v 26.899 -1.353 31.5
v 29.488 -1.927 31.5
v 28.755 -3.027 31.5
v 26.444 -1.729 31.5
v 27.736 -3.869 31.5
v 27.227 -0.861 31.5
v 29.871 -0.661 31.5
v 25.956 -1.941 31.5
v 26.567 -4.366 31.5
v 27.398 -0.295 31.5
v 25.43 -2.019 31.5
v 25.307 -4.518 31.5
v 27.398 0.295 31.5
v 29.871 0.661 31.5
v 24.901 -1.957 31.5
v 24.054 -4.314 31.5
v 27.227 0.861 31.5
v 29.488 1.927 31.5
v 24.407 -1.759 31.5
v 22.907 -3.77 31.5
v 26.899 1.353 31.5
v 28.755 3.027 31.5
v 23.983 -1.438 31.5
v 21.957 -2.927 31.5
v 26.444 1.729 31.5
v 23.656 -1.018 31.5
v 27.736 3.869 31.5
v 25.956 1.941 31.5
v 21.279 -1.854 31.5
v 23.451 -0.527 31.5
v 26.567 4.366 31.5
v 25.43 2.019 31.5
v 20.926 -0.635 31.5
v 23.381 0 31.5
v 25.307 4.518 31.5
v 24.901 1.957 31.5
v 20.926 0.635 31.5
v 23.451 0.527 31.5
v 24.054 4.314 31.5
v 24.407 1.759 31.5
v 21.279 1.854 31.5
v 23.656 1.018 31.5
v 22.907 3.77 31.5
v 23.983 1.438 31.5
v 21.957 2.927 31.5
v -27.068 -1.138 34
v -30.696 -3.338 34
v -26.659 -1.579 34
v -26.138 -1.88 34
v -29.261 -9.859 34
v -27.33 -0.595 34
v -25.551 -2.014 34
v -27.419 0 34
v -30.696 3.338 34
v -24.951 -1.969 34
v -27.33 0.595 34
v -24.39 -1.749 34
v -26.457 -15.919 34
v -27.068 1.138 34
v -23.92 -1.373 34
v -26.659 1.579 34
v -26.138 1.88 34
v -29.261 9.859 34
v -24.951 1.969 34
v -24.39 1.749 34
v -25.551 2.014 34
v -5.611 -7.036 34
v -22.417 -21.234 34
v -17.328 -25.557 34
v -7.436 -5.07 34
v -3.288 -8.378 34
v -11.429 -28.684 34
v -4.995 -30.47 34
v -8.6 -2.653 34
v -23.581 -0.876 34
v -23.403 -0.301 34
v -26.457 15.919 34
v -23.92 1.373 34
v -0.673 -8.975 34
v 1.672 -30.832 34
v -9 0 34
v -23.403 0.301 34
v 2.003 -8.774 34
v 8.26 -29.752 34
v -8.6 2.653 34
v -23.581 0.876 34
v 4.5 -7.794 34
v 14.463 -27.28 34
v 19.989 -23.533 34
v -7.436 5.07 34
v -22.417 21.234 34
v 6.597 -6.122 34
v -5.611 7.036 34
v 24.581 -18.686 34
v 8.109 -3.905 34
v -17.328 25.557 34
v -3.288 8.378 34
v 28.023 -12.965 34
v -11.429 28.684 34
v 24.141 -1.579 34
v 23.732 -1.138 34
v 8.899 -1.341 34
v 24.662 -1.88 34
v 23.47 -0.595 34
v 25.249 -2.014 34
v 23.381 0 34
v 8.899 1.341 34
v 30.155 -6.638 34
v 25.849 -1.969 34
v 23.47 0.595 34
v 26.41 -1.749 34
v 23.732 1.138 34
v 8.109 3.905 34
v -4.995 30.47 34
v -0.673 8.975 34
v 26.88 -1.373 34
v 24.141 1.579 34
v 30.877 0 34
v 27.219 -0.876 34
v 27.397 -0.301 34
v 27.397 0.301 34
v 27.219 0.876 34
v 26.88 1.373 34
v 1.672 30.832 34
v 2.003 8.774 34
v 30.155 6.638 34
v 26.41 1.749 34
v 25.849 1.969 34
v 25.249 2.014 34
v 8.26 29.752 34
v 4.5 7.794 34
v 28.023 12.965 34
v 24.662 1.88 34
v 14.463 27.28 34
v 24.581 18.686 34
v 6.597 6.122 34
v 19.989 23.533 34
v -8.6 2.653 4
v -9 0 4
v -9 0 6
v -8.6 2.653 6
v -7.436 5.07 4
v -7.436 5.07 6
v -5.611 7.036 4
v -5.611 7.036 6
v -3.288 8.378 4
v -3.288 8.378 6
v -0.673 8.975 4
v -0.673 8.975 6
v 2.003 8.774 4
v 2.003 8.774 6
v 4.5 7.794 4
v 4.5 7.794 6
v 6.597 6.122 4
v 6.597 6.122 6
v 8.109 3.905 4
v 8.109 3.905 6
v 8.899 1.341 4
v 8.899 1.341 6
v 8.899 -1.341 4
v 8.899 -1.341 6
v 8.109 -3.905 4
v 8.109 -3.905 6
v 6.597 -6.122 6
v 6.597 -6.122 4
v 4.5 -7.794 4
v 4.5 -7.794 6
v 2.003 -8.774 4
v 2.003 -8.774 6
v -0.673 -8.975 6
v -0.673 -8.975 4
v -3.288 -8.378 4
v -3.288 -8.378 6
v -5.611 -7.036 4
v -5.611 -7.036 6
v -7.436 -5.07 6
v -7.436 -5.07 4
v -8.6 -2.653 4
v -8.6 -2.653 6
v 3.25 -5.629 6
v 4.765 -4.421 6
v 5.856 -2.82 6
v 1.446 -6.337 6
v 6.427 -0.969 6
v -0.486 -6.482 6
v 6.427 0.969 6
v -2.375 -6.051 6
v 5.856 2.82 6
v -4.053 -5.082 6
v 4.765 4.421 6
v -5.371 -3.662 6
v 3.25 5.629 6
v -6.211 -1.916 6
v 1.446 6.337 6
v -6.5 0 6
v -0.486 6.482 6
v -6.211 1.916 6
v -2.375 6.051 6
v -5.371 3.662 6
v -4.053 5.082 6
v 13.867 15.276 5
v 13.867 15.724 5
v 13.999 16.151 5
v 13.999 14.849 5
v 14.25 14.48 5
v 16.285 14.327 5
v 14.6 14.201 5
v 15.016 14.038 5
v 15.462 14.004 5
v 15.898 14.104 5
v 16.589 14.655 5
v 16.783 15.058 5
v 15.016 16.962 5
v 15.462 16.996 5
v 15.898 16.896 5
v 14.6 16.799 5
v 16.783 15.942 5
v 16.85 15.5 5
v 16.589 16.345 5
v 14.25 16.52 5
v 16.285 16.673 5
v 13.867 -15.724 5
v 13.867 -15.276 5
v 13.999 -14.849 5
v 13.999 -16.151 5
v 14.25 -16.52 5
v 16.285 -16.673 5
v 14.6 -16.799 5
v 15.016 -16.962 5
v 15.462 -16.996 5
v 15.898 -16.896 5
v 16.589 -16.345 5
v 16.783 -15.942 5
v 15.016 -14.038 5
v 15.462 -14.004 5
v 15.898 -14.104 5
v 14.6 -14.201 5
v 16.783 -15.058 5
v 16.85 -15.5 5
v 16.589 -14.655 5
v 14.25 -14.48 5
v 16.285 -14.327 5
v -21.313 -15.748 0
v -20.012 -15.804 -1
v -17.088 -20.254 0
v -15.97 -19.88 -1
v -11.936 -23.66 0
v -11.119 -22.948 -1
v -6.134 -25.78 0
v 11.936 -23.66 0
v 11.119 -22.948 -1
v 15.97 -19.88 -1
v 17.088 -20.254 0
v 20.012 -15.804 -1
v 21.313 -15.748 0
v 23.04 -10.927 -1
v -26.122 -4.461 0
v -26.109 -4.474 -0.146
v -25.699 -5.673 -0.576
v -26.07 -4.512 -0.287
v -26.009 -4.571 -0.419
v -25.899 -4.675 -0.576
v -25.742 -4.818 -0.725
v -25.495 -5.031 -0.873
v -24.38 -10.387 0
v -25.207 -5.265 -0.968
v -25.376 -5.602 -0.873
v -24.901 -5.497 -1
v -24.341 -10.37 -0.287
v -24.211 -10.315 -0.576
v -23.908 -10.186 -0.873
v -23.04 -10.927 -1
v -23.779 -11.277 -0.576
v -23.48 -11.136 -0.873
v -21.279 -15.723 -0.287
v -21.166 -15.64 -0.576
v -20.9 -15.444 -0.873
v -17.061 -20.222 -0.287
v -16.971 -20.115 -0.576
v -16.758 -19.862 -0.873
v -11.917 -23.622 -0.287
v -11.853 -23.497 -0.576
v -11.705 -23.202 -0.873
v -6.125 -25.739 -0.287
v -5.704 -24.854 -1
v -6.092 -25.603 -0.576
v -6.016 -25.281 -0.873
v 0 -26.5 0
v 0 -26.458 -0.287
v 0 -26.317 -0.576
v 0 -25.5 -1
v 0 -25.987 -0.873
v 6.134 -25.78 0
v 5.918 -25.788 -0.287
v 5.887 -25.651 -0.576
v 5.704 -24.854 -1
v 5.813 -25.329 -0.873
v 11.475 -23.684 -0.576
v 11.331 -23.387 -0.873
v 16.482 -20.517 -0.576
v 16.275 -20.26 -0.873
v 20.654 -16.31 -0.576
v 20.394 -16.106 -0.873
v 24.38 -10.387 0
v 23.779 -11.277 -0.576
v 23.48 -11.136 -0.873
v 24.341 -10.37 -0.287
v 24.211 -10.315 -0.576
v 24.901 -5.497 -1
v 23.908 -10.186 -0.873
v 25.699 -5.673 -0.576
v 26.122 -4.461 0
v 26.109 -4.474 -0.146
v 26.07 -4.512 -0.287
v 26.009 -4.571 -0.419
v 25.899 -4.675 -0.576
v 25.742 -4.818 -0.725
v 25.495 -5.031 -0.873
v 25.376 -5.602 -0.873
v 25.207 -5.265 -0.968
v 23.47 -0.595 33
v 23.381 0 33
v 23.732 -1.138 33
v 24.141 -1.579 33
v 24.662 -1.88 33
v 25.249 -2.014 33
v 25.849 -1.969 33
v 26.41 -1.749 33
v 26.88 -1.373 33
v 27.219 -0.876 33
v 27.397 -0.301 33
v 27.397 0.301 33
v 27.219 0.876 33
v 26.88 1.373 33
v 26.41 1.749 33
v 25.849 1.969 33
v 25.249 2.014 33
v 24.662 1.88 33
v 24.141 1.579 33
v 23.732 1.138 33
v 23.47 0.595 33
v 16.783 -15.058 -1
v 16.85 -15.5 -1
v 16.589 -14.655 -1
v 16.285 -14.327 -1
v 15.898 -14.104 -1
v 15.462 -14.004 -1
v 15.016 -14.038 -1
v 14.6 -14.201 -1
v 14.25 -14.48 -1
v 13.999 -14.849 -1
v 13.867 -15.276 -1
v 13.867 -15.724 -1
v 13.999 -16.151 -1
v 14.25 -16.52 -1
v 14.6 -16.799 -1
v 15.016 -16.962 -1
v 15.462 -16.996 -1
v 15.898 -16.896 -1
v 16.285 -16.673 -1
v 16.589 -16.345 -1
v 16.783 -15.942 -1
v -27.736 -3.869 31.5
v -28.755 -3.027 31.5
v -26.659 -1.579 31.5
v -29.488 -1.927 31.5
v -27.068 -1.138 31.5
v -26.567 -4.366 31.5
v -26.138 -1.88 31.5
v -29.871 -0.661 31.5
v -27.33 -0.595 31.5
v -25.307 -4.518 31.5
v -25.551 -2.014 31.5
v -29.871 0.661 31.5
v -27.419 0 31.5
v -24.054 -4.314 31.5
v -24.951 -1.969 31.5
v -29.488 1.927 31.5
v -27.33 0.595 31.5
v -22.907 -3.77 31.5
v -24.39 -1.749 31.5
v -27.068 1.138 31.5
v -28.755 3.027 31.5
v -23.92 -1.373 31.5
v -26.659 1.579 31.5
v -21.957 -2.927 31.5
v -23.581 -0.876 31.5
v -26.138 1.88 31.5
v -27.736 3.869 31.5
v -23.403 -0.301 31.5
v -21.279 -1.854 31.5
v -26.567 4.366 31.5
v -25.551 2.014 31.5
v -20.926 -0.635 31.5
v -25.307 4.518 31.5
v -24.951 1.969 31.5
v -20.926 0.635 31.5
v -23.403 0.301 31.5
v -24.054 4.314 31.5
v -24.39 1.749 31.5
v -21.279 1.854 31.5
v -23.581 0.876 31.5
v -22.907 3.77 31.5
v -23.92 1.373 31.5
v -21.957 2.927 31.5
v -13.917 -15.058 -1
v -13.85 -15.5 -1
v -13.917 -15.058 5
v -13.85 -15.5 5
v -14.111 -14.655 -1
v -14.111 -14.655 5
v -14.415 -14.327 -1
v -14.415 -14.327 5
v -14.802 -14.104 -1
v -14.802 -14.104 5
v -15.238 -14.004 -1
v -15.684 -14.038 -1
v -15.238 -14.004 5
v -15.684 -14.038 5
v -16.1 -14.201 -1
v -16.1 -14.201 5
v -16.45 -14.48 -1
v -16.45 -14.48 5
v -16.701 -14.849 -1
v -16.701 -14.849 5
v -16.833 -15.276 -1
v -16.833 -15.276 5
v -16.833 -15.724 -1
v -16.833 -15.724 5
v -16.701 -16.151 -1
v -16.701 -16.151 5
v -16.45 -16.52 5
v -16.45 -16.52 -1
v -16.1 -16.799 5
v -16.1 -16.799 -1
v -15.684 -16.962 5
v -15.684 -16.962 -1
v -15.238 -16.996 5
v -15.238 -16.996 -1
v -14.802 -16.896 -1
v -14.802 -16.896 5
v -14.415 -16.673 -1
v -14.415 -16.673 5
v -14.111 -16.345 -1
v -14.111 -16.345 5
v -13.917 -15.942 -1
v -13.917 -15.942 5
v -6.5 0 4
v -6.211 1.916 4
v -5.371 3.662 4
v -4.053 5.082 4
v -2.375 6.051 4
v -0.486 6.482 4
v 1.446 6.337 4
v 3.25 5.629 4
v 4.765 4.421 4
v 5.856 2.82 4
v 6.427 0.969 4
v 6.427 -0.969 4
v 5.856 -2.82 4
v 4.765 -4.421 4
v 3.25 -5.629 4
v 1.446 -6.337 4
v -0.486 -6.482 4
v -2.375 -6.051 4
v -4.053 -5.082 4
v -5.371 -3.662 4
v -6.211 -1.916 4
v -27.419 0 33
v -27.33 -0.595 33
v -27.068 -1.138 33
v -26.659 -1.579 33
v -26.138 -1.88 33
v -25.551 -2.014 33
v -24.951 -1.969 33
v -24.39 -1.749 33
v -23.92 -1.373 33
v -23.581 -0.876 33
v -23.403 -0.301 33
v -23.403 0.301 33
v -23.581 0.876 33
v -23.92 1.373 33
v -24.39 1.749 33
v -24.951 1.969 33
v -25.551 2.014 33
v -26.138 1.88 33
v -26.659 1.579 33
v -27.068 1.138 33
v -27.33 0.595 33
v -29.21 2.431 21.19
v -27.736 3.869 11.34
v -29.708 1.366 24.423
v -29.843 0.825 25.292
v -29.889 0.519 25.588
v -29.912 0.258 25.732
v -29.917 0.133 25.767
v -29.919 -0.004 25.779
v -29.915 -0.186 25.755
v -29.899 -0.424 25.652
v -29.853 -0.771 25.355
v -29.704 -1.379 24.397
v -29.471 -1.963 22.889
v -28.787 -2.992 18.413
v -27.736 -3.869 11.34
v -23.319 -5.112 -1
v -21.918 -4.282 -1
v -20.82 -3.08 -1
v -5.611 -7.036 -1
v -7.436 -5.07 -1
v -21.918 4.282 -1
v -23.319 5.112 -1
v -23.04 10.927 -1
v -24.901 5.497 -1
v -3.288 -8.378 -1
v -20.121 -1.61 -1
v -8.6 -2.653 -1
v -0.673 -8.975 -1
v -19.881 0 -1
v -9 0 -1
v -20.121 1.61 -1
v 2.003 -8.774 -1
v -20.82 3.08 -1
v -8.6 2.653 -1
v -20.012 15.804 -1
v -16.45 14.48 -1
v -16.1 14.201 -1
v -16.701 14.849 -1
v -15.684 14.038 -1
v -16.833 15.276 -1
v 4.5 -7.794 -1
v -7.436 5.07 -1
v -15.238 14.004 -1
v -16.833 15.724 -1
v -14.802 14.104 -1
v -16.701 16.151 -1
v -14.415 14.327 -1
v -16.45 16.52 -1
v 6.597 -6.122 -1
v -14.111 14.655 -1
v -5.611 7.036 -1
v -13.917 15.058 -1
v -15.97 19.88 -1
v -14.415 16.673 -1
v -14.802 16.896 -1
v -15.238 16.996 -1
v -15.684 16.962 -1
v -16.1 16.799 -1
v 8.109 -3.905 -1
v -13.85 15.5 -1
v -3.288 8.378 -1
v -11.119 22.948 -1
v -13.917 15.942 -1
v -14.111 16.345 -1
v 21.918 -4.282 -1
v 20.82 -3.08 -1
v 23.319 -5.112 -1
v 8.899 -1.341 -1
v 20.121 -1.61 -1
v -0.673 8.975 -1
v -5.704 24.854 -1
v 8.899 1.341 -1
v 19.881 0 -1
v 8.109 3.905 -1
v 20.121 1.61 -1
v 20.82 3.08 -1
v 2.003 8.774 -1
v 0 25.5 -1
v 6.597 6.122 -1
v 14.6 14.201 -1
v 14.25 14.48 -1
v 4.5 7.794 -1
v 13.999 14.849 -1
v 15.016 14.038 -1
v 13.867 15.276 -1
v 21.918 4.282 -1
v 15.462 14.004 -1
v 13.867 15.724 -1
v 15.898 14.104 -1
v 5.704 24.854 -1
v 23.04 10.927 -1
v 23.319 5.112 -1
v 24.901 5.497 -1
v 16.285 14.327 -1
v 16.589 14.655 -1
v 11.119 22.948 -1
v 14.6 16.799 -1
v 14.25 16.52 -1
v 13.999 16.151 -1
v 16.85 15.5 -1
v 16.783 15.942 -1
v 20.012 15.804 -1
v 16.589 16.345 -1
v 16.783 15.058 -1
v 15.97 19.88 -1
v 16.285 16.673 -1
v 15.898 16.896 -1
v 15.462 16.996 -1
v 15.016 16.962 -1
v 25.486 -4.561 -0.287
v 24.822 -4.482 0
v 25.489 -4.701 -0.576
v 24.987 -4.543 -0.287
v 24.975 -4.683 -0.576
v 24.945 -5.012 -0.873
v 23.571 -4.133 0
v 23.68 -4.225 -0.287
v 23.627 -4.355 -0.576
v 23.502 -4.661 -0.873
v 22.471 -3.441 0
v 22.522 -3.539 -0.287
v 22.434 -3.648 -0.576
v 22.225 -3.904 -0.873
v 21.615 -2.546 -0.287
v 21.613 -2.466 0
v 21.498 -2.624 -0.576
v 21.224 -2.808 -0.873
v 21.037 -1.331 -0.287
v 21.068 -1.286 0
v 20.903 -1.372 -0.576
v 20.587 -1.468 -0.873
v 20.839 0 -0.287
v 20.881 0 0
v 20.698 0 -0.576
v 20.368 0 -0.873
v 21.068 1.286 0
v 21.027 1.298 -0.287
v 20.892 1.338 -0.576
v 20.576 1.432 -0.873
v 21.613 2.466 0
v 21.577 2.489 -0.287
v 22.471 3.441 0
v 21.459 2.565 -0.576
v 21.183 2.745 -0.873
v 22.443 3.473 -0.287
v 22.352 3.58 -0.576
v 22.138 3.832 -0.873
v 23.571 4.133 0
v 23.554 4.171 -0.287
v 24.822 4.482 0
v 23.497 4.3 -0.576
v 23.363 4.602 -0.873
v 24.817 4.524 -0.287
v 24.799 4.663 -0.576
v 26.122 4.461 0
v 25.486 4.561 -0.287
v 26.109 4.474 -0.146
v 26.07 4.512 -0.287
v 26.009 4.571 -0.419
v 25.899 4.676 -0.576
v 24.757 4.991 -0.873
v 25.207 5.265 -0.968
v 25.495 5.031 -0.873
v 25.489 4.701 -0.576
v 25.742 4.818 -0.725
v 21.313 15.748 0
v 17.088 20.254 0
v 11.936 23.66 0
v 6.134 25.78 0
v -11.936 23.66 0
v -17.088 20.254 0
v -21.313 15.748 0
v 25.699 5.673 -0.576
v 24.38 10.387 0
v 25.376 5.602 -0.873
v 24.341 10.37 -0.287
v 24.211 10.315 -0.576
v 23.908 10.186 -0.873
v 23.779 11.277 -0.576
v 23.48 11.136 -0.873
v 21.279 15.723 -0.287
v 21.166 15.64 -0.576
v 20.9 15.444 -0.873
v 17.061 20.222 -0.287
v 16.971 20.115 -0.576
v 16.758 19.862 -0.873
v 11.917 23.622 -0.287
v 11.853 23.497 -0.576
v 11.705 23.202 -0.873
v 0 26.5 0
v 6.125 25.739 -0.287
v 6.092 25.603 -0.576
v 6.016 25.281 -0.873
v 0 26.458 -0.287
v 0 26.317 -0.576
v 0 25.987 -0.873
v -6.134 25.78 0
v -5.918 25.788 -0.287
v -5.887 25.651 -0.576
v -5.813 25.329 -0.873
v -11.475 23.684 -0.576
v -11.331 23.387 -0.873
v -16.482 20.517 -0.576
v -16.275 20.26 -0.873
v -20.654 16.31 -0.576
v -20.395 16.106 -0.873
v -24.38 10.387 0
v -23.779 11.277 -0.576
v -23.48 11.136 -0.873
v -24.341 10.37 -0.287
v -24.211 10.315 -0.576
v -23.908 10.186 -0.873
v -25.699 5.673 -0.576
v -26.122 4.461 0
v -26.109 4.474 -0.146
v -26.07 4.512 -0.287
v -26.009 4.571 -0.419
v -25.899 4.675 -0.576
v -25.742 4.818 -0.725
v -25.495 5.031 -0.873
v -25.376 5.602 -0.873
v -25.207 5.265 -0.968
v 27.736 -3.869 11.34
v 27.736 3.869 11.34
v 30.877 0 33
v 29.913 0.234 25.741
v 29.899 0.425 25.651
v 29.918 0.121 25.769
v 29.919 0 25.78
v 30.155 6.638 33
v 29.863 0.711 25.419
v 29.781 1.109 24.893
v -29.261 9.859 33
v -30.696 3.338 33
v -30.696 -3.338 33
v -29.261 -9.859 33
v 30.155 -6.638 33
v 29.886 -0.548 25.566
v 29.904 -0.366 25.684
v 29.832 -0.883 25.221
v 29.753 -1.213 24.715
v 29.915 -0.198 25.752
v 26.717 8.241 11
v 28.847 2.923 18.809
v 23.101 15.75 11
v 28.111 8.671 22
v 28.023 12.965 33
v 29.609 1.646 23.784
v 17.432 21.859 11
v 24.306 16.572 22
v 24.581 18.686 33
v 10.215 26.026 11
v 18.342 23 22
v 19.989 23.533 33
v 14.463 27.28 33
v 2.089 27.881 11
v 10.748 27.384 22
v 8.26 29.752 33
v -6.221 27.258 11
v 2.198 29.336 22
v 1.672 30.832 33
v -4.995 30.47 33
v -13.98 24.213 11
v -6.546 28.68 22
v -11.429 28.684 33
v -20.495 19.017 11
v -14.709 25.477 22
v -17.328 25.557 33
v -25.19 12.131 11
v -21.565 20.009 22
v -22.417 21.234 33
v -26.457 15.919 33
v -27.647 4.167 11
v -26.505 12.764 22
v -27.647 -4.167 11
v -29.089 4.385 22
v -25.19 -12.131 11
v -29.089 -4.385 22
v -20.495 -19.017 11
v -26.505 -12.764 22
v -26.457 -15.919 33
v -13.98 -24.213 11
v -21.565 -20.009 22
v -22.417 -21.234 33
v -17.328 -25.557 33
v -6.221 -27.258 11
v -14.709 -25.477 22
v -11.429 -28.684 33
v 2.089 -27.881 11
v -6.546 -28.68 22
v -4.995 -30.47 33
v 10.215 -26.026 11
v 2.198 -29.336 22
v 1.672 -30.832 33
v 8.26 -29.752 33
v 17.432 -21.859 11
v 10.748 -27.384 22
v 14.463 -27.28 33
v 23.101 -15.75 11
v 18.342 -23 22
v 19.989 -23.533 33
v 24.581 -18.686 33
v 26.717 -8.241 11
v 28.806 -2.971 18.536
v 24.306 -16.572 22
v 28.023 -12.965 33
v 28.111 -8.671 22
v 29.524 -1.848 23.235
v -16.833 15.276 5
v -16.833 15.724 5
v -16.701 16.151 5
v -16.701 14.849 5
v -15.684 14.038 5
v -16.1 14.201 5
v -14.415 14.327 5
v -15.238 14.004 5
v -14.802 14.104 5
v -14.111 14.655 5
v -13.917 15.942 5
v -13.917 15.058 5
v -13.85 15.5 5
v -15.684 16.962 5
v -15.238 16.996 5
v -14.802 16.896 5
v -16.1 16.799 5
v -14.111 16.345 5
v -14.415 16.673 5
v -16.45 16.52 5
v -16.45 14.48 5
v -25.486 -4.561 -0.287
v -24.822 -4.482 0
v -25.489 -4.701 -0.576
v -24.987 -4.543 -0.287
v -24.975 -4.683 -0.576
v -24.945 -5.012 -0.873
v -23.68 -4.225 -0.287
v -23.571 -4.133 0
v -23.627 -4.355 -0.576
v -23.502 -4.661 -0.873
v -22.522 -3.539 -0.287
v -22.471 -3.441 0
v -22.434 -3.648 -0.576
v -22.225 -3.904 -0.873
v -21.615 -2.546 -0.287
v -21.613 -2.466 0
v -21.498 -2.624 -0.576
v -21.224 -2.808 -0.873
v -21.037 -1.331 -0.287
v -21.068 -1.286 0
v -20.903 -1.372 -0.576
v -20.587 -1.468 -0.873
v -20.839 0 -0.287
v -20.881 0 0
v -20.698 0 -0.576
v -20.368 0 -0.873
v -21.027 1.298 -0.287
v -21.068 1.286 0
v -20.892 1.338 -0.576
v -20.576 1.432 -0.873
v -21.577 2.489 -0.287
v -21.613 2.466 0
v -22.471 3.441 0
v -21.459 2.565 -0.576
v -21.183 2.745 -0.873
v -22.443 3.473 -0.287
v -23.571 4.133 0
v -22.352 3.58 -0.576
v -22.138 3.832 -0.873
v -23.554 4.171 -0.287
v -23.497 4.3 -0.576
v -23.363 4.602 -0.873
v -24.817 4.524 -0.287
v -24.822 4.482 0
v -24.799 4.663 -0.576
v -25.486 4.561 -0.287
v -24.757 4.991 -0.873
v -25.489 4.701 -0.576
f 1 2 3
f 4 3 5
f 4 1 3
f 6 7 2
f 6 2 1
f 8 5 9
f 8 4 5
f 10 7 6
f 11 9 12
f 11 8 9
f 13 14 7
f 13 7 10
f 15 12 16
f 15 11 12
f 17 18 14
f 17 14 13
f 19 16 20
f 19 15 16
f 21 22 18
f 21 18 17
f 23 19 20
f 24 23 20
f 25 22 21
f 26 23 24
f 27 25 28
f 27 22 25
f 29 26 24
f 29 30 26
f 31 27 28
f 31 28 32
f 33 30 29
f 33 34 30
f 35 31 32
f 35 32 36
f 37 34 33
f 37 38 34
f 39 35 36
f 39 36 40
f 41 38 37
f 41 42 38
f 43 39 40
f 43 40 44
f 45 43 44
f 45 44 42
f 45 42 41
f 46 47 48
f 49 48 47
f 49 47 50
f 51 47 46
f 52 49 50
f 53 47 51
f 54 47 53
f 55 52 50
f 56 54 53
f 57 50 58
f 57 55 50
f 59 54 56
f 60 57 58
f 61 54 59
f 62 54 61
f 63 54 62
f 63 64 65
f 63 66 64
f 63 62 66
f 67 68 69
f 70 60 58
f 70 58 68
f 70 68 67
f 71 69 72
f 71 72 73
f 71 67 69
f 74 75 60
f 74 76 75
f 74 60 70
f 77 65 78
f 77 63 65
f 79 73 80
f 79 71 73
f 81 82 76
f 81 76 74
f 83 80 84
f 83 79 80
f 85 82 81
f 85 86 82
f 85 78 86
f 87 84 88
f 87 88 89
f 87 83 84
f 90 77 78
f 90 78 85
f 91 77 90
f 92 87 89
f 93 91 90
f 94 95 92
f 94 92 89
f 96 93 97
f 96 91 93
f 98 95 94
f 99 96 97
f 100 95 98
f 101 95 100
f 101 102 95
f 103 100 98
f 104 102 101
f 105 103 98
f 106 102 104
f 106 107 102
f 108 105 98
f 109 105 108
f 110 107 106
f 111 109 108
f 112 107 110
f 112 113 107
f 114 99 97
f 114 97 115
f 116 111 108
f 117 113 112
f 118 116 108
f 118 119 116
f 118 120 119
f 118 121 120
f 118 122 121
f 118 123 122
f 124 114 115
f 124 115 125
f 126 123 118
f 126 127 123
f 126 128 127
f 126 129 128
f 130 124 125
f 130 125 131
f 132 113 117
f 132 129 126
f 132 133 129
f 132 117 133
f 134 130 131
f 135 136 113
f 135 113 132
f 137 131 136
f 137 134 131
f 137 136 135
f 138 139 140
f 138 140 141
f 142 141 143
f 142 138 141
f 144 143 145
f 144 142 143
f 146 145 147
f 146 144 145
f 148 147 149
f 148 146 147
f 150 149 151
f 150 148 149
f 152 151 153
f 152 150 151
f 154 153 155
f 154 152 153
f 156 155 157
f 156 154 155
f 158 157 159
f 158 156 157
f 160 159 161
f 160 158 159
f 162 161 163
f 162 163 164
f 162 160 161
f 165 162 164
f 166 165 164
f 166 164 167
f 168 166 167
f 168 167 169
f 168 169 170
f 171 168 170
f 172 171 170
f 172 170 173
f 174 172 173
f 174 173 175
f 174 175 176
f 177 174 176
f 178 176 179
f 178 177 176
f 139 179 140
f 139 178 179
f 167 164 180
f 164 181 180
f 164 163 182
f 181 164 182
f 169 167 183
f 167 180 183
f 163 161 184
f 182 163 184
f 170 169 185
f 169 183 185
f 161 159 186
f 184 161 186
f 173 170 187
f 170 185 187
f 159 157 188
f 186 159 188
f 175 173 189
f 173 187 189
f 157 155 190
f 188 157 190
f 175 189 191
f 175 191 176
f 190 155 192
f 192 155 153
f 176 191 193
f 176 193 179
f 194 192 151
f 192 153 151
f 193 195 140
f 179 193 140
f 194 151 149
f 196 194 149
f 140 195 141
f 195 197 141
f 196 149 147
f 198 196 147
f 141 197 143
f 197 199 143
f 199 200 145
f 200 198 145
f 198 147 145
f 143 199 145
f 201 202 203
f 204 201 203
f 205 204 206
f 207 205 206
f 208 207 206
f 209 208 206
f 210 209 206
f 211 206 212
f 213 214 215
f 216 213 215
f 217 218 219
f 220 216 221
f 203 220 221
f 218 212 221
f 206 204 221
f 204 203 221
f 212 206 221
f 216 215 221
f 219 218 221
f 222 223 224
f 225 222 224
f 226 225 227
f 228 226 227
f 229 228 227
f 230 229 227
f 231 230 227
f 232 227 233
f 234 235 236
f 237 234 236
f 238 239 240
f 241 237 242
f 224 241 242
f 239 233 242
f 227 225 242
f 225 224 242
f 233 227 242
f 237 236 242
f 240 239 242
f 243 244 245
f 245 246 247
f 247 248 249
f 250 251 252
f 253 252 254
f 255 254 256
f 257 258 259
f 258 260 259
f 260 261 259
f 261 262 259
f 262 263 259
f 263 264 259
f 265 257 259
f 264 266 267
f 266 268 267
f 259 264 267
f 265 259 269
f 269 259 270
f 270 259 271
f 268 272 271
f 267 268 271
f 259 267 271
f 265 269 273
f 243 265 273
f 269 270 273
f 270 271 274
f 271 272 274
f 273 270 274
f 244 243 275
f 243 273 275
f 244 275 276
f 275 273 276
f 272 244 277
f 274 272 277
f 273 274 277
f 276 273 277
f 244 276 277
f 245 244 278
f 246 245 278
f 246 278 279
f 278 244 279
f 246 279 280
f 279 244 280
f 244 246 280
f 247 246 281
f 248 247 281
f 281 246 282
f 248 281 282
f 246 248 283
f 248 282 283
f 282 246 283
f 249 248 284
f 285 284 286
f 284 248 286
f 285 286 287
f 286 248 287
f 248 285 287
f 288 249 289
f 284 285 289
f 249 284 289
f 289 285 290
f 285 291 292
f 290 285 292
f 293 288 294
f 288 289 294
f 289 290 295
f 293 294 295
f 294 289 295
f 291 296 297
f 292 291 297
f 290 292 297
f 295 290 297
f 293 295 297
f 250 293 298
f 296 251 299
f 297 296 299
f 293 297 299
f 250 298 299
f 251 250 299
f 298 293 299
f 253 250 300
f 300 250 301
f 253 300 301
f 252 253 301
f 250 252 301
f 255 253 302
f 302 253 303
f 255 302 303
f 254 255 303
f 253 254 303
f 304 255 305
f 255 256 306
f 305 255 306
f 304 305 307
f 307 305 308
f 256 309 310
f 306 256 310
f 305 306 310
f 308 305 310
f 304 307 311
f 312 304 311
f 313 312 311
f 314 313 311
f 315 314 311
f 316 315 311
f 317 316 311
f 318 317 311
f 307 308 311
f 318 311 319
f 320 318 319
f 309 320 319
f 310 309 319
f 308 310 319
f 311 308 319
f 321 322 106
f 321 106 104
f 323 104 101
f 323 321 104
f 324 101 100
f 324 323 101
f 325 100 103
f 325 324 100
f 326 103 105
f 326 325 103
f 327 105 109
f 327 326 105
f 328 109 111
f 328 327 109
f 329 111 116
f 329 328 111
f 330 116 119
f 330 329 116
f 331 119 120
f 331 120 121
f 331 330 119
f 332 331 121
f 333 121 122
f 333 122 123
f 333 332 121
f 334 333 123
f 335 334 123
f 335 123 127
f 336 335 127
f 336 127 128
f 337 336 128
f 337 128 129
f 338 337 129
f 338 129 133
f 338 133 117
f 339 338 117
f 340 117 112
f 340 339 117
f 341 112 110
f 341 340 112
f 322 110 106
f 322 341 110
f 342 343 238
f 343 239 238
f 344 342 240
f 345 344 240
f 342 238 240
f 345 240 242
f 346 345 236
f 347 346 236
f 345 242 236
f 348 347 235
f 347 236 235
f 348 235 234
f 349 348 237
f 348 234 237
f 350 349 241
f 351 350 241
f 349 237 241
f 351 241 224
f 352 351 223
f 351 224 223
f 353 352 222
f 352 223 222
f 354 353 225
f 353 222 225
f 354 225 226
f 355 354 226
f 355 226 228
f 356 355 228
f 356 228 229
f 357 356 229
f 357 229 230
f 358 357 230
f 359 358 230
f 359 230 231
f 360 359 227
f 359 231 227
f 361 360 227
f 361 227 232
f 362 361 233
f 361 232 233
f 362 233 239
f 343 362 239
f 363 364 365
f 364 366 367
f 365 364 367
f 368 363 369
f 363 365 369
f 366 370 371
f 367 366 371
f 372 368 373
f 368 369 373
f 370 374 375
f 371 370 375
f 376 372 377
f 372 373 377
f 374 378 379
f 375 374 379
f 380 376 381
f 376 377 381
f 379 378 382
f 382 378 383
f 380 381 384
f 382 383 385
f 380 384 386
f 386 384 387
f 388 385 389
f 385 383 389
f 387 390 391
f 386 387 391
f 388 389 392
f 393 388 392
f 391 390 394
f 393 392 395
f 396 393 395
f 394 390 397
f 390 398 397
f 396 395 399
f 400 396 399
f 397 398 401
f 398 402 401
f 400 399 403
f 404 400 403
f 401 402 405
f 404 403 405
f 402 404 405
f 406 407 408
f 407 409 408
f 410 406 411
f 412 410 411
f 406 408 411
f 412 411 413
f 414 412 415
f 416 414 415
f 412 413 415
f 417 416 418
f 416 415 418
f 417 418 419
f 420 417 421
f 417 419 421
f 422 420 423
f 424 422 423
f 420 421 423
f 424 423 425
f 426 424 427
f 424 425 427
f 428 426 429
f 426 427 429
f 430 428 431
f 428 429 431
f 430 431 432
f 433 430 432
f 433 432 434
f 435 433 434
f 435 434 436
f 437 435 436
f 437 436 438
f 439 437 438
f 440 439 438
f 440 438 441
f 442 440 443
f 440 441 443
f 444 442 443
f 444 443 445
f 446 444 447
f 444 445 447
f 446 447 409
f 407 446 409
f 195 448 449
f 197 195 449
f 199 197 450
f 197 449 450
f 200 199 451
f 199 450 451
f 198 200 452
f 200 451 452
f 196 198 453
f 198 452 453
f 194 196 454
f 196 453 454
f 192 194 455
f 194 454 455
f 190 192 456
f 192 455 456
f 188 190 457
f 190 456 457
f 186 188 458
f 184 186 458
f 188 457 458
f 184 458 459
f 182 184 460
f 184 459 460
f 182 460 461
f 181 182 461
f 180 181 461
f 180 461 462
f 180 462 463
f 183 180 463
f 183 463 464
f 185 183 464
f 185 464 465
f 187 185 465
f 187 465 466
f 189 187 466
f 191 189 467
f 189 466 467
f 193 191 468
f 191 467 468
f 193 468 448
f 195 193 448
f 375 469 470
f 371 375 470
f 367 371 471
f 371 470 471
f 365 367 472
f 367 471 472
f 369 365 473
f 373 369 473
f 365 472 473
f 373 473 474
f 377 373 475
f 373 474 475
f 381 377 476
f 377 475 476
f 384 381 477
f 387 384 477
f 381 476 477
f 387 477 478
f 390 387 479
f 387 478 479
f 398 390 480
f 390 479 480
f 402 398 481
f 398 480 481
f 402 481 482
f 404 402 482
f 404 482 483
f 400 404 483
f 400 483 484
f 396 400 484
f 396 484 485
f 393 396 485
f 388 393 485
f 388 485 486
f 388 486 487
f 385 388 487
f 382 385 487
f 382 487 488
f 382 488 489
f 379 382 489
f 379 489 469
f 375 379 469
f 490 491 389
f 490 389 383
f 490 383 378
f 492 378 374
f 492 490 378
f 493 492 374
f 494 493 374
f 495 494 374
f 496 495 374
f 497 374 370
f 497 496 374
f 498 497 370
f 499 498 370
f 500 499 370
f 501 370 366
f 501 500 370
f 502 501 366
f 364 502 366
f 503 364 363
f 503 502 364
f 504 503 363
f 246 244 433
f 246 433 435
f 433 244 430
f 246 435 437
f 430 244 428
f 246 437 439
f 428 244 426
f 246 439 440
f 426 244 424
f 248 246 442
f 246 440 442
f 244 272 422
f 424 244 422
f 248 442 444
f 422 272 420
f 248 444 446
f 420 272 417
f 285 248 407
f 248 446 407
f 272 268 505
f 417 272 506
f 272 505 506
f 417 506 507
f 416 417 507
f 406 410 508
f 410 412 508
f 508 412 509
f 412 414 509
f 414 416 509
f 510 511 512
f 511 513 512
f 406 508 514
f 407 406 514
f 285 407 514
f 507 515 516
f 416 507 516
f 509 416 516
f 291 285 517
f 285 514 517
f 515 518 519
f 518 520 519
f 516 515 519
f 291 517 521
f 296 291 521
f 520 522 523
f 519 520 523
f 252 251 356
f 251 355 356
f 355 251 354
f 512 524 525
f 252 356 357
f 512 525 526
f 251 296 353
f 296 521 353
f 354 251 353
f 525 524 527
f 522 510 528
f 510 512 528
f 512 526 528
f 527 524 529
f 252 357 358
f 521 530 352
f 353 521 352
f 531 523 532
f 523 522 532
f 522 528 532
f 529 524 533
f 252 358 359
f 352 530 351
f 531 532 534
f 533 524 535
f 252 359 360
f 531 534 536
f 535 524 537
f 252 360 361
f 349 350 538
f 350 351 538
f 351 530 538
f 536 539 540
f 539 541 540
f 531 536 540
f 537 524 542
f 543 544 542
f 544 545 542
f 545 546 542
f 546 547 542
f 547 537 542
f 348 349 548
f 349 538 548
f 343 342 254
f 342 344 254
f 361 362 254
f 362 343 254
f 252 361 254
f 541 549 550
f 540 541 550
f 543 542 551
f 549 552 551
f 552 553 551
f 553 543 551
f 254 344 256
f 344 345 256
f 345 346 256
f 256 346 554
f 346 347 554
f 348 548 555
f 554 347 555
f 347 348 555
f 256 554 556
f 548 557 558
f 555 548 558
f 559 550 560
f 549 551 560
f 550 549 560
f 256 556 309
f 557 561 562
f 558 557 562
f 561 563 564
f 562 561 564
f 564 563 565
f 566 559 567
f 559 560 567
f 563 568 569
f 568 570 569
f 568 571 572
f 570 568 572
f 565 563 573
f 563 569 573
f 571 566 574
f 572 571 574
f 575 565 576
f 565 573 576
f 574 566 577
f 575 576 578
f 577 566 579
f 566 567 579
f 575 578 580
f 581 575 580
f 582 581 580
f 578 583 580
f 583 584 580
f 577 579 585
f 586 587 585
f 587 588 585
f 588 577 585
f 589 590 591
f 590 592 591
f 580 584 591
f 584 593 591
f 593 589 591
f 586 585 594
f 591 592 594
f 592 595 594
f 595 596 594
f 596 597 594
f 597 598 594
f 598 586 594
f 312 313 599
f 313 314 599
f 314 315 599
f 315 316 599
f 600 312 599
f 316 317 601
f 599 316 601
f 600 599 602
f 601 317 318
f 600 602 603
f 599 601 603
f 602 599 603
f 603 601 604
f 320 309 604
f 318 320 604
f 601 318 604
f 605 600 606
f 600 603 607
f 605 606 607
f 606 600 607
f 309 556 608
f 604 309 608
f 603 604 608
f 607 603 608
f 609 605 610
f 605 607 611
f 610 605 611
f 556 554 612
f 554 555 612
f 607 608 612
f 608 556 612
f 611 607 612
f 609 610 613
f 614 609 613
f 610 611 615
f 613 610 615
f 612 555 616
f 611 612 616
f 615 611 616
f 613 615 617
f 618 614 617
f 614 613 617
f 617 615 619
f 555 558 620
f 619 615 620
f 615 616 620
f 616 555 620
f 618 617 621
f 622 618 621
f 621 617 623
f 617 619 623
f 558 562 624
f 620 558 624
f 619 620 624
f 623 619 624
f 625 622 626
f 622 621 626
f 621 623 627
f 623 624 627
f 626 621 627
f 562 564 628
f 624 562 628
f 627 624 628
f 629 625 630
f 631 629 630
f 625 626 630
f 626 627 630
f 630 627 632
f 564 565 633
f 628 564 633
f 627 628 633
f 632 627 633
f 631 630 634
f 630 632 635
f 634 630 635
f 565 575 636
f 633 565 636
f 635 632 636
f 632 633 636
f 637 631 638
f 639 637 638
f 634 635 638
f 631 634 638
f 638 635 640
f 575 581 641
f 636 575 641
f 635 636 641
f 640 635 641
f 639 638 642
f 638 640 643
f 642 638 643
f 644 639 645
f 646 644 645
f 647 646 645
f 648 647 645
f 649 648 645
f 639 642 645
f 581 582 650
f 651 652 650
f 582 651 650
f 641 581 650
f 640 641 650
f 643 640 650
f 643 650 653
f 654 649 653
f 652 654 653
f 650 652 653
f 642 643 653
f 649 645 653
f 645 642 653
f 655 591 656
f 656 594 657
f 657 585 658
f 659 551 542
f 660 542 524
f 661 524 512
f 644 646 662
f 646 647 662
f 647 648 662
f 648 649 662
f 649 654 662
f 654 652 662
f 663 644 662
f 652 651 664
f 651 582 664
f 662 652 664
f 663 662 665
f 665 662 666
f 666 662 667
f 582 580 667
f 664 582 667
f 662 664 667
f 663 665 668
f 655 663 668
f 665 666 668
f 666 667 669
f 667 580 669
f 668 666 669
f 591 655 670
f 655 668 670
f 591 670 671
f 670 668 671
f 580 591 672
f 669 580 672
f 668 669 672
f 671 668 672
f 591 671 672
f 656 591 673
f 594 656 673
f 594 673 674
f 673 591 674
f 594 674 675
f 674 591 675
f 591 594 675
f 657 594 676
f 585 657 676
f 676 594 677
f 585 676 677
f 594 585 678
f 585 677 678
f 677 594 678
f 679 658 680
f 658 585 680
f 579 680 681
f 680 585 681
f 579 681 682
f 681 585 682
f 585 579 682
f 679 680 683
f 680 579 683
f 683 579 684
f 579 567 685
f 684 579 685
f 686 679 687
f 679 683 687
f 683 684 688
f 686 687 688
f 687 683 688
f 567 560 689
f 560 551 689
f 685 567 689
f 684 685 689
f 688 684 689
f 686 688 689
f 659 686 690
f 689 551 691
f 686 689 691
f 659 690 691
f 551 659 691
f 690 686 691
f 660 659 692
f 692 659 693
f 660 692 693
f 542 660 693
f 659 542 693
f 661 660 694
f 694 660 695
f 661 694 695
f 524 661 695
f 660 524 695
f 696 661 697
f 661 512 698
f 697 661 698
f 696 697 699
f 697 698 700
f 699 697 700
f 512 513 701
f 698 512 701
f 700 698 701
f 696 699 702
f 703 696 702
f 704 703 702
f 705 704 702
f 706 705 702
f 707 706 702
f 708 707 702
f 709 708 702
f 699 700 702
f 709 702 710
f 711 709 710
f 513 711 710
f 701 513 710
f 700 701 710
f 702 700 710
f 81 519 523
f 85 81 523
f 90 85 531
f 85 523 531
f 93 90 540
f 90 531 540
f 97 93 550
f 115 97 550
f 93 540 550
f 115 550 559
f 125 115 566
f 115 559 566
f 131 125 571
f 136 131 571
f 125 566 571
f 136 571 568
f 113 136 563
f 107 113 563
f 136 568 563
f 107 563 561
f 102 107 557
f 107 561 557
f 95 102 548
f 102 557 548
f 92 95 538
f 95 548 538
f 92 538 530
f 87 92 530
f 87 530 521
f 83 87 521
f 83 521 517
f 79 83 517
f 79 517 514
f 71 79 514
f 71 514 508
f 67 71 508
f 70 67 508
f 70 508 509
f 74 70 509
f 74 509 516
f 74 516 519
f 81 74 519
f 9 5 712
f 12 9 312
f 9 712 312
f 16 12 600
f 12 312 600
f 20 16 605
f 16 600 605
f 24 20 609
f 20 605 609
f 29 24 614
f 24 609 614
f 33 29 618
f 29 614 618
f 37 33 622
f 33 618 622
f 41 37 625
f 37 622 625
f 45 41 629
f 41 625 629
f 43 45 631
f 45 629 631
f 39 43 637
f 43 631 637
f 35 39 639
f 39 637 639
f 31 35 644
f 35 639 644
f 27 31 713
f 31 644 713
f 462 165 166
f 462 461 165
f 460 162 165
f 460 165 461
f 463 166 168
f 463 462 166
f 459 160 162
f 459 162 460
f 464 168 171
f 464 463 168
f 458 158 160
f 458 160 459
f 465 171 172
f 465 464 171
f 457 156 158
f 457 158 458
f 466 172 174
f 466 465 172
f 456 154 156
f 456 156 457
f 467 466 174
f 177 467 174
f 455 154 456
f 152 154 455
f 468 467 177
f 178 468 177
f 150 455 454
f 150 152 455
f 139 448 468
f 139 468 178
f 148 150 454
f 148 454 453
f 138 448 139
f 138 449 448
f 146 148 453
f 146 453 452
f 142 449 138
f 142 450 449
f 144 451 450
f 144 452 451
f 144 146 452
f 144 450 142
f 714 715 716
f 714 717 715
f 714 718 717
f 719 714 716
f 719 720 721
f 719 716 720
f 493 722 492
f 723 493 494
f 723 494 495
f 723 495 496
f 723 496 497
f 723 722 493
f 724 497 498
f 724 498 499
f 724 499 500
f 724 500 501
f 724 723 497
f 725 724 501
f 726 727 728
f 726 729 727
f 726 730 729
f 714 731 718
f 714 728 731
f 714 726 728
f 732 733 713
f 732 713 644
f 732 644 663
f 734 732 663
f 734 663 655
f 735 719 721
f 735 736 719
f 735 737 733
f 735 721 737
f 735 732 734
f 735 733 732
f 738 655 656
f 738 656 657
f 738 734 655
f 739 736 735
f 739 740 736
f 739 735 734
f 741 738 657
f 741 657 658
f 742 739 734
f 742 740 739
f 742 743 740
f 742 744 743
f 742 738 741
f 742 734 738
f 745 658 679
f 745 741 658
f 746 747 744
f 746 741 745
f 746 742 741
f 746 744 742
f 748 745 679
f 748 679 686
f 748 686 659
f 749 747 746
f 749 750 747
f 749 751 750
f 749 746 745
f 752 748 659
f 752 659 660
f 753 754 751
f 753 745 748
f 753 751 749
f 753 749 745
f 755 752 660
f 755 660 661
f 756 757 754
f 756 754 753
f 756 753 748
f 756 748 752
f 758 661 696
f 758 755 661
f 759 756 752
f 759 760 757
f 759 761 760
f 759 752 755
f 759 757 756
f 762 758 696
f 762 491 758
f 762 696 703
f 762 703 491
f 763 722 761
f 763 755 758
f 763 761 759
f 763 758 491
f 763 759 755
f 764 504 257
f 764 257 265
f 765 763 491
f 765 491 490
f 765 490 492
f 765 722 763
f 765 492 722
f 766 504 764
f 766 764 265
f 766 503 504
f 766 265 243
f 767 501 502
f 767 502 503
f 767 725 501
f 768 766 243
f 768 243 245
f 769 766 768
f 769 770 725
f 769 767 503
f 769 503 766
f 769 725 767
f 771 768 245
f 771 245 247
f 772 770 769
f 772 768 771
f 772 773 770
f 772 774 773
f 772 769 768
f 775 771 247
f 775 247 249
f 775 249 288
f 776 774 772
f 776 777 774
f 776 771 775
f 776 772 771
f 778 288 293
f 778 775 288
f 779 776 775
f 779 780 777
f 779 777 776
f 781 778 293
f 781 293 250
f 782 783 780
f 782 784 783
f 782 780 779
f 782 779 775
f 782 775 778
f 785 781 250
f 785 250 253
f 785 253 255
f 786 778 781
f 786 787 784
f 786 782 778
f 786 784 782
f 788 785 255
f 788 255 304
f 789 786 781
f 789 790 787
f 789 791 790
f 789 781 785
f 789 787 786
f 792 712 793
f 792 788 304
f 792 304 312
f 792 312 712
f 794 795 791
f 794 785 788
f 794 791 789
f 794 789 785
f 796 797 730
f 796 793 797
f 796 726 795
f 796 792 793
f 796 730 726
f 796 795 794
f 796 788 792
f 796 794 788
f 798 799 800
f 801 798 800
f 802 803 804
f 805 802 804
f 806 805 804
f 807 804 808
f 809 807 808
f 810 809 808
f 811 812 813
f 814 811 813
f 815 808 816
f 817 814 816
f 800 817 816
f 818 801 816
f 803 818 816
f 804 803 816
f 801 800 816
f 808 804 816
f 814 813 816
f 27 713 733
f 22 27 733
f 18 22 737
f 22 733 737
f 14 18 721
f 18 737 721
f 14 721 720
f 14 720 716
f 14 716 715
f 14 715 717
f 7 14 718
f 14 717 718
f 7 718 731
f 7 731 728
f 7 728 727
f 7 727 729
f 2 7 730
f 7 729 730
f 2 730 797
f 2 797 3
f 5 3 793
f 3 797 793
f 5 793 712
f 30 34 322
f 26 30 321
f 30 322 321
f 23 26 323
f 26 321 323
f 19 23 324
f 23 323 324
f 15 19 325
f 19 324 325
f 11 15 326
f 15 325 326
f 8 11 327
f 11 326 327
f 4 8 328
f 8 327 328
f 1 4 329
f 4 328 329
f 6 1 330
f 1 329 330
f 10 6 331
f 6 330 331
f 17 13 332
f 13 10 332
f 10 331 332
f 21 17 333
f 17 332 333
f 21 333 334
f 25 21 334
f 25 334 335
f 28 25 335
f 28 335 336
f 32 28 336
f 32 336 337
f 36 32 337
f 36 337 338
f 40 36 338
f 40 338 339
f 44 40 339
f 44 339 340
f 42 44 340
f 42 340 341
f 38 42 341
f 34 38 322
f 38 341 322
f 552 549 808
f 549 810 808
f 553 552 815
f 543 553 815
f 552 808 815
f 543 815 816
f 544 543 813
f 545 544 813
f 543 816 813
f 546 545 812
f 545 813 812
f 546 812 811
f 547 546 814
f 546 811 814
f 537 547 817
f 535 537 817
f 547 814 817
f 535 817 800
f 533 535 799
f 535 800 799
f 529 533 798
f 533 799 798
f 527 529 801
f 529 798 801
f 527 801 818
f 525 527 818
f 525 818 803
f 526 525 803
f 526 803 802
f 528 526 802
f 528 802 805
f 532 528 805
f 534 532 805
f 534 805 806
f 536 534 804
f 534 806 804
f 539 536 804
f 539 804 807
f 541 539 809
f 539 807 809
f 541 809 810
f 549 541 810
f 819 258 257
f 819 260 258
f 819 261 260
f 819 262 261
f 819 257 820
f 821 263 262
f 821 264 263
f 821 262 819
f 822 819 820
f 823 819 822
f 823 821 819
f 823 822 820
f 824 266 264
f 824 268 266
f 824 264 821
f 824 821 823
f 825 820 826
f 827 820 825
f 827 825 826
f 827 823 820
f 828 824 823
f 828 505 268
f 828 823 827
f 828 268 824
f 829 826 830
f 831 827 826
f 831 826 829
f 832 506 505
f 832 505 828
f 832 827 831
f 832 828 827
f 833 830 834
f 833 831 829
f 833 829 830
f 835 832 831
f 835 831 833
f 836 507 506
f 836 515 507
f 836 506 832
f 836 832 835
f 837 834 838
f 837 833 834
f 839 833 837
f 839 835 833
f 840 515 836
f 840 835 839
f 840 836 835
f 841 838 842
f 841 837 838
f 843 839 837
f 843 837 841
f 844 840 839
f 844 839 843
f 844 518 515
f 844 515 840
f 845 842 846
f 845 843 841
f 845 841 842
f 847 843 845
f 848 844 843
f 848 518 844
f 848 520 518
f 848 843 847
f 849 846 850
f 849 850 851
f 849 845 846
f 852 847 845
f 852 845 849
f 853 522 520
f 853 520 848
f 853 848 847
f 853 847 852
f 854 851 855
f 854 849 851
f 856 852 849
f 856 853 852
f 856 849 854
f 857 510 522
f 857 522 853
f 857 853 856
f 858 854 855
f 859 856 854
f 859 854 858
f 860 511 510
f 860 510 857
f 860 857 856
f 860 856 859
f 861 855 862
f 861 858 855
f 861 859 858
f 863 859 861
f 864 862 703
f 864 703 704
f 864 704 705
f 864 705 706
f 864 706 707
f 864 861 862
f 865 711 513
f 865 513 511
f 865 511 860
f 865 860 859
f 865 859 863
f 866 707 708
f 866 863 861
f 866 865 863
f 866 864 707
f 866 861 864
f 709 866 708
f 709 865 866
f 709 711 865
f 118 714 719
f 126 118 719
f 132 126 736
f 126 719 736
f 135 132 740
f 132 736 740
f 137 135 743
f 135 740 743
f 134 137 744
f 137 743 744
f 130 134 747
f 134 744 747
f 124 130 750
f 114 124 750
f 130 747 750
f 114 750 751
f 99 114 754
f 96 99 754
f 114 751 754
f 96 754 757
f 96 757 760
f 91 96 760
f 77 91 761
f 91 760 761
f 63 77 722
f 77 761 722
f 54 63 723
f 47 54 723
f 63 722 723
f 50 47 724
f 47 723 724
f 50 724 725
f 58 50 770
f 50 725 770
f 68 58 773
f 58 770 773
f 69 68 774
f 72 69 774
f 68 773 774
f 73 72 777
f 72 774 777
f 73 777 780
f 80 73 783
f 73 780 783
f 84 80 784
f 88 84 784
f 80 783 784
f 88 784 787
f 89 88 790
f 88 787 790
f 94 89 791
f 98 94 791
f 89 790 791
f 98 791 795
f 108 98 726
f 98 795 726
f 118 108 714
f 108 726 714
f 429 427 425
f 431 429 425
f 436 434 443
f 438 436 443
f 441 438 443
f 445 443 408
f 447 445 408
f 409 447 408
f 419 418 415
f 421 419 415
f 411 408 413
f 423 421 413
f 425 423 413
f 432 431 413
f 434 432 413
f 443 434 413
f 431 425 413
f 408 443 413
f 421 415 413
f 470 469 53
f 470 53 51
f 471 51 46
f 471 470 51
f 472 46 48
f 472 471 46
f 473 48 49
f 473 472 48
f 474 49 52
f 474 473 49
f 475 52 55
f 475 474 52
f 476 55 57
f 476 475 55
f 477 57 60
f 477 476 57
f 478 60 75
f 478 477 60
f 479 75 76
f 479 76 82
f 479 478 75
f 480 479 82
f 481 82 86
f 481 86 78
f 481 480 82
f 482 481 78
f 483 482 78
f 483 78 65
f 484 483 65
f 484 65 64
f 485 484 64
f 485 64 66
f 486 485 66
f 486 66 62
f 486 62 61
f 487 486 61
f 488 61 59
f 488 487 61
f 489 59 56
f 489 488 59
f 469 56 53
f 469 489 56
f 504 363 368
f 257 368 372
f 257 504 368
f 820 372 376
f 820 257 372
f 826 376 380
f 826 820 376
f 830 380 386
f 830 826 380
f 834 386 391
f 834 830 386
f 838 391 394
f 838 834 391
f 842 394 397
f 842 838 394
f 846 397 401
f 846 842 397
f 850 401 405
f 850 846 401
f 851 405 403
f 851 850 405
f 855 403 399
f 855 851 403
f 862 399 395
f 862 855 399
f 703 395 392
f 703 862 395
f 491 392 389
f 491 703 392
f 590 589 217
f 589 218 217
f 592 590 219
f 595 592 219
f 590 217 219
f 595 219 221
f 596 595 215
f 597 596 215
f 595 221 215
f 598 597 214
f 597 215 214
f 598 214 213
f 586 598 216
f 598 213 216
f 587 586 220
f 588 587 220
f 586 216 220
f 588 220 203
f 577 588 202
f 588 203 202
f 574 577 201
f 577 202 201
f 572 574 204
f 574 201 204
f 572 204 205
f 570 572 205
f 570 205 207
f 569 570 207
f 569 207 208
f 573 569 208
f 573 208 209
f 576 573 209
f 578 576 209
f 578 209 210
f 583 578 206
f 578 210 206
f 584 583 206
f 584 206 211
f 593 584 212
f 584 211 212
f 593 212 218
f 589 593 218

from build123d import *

# Parameters (mm, degrees)
SKETCH1_R           = 26.5
SKETCH1_R_2         = 1.5
BOSS_EXTRUDE1_DEPTH = 1
SKETCH2_R           = 30.877
BOSS_EXTRUDE2_DEPTH = 1
CUT_EXTRUDE1_START  = 5
SKETCH1_5_R         = 1.5
CUT_EXTRUDE1_DEPTH  = 5
CUT_EXTRUDE2_DEPTH  = 56.34237319
CUT_EXTRUDE3_DEPTH  = 32.5
SKETCH4_R           = 9
CUT_EXTRUDE4_DEPTH  = 56.962293291
FILLET1_R           = 1
BOSS_EXTRUDE3_START = -5
SKETCH5_R           = 9
SKETCH5_R_2         = 6.5
BOSS_EXTRUDE3_DEPTH = 2


with BuildPart() as part:
    # Sketch1 → Boss-Extrude1 (new body)
    with BuildSketch(Plane.XY):
        Circle(SKETCH1_R)
        with Locations((-15.35, -15.5)):
            Circle(SKETCH1_R_2, mode=Mode.SUBTRACT)
        with Locations((15.35, -15.5)):
            Circle(SKETCH1_R_2, mode=Mode.SUBTRACT)
        with Locations((15.35, 15.5)):
            Circle(SKETCH1_R_2, mode=Mode.SUBTRACT)
        with Locations((-15.35, 15.5)):
            Circle(SKETCH1_R_2, mode=Mode.SUBTRACT)
    extrude(amount=-BOSS_EXTRUDE1_DEPTH)



with BuildPart() as body_2:
    # Sketch2 → Boss-Extrude2 (new body)
    with BuildSketch(Plane.XY.offset(33)):
        Circle(SKETCH2_R)
        with BuildLine():
            ThreePointArc((27.4193, 0), (25.4, 2.0193), (23.3807, 0))
            ThreePointArc((23.3807, 0), (25.4, -2.0193), (27.4193, 0))
        make_face(mode=Mode.SUBTRACT)
        with BuildLine():
            ThreePointArc((-23.3807, 0), (-25.4, 2.0193), (-27.4193, 0))
            ThreePointArc((-27.4193, 0), (-25.4, -2.0193), (-23.3807, 0))
        make_face(mode=Mode.SUBTRACT)
    extrude(amount=BOSS_EXTRUDE2_DEPTH)


with BuildPart() as part_1:
    add(part.part)

    add(body_2.part)  # loft1 joins it to this body
    # loft up to a face of the part (loft1)
    loft([Face(Wire([part_1.edges().sort_by_distance((-18.140498307, 19.317668627, 0))[0]])), Face(Wire([part_1.edges().sort_by_distance((-21.13676099, -22.508364309, 33))[0]]))])

    # Sketch1<5> → Cut-Extrude1 (cut)
    with BuildSketch(Plane.XY.offset(CUT_EXTRUDE1_START)):
        with Locations((15.35, 15.5)):
            Circle(SKETCH1_5_R)
        with Locations((-15.35, 15.5)):
            Circle(SKETCH1_5_R)
        with Locations((-15.35, -15.5)):
            Circle(SKETCH1_5_R)
        with Locations((15.35, -15.5)):
            Circle(SKETCH1_5_R)
    extrude(amount=-CUT_EXTRUDE1_DEPTH, mode=Mode.SUBTRACT)

    # Sketch2<6> → Cut-Extrude2 (cut, through all)
    with BuildSketch(Plane.XY.offset(33)):
        with BuildLine():
            ThreePointArc((27.4193, 0), (25.4, 2.0193), (23.3807, 0))
            ThreePointArc((23.3807, 0), (25.4, -2.0193), (27.4193, 0))
        make_face()
        with BuildLine():
            ThreePointArc((-23.3807, 0), (-25.4, 2.0193), (-27.4193, 0))
            ThreePointArc((-27.4193, 0), (-25.4, -2.0193), (-23.3807, 0))
        make_face()
    extrude(amount=-CUT_EXTRUDE2_DEPTH, mode=Mode.SUBTRACT)

    # Sketch3 → Cut-Extrude3 (cut)
    # profile 1 of 2: a face of its own
    with BuildSketch(Plane(origin=(0, 0, -1), x_dir=(-1, 0, 0), z_dir=(0, 0, -1))):
        with BuildLine():
            ThreePointArc((-27.735523845, -3.869030998), (-20.8807, 0), (-27.735523845, 3.869030998))
            ThreePointArc((-27.735523845, 3.869030998), (-29.9193, 0), (-27.735523845, -3.869030998))
        make_face()
        with BuildLine():
            ThreePointArc((-26.443551723, 1.728748765), (-27.4193, 0), (-26.443551723, -1.728748765))
            ThreePointArc((-26.443551723, -1.728748765), (-23.3807, 0), (-26.443551723, 1.728748765))
        make_face(mode=Mode.SUBTRACT)
    # profile 2 of 2: a face of its own
    with BuildSketch(Plane(origin=(0, 0, -1), x_dir=(-1, 0, 0), z_dir=(0, 0, -1))):
        with BuildLine():
            ThreePointArc((27.735523845, -3.869030998), (20.8807, 0), (27.735523845, 3.869030998))
            ThreePointArc((27.735523845, 3.869030998), (29.9193, 0), (27.735523845, -3.869030998))
        make_face()
    extrude(amount=-CUT_EXTRUDE3_DEPTH, mode=Mode.SUBTRACT)

    # Sketch4 → Cut-Extrude4 (cut, through all)
    with BuildSketch(Plane(origin=(0, 0, -1), x_dir=(-1, 0, 0), z_dir=(0, 0, -1))):
        Circle(SKETCH4_R)
    extrude(amount=-CUT_EXTRUDE4_DEPTH, mode=Mode.SUBTRACT)

    # Fillet1
    fillet1_edges = [part_1.edges().sort_by_distance(p)[0] for p in [
        (-20.8807, 0, -1),
        (0, 26.5, -1),
        (0, -26.5, -1),
        (20.8807, 0, -1),
    ]]
    fillet(fillet1_edges, radius=FILLET1_R - 0.0001)  # a hair under: the kernel refuses the full size


with BuildPart() as body_2_2:
    # Sketch5 → Boss-Extrude3 (new body)
    with BuildSketch(Plane(origin=(0, 0, -1), x_dir=(-1, 0, 0), z_dir=(0, 0, -1)).offset(BOSS_EXTRUDE3_START)):
        Circle(SKETCH5_R)
        Circle(SKETCH5_R_2, mode=Mode.SUBTRACT)
    extrude(amount=-BOSS_EXTRUDE3_DEPTH)


solid = Compound([part_1.part, body_2_2.part])
